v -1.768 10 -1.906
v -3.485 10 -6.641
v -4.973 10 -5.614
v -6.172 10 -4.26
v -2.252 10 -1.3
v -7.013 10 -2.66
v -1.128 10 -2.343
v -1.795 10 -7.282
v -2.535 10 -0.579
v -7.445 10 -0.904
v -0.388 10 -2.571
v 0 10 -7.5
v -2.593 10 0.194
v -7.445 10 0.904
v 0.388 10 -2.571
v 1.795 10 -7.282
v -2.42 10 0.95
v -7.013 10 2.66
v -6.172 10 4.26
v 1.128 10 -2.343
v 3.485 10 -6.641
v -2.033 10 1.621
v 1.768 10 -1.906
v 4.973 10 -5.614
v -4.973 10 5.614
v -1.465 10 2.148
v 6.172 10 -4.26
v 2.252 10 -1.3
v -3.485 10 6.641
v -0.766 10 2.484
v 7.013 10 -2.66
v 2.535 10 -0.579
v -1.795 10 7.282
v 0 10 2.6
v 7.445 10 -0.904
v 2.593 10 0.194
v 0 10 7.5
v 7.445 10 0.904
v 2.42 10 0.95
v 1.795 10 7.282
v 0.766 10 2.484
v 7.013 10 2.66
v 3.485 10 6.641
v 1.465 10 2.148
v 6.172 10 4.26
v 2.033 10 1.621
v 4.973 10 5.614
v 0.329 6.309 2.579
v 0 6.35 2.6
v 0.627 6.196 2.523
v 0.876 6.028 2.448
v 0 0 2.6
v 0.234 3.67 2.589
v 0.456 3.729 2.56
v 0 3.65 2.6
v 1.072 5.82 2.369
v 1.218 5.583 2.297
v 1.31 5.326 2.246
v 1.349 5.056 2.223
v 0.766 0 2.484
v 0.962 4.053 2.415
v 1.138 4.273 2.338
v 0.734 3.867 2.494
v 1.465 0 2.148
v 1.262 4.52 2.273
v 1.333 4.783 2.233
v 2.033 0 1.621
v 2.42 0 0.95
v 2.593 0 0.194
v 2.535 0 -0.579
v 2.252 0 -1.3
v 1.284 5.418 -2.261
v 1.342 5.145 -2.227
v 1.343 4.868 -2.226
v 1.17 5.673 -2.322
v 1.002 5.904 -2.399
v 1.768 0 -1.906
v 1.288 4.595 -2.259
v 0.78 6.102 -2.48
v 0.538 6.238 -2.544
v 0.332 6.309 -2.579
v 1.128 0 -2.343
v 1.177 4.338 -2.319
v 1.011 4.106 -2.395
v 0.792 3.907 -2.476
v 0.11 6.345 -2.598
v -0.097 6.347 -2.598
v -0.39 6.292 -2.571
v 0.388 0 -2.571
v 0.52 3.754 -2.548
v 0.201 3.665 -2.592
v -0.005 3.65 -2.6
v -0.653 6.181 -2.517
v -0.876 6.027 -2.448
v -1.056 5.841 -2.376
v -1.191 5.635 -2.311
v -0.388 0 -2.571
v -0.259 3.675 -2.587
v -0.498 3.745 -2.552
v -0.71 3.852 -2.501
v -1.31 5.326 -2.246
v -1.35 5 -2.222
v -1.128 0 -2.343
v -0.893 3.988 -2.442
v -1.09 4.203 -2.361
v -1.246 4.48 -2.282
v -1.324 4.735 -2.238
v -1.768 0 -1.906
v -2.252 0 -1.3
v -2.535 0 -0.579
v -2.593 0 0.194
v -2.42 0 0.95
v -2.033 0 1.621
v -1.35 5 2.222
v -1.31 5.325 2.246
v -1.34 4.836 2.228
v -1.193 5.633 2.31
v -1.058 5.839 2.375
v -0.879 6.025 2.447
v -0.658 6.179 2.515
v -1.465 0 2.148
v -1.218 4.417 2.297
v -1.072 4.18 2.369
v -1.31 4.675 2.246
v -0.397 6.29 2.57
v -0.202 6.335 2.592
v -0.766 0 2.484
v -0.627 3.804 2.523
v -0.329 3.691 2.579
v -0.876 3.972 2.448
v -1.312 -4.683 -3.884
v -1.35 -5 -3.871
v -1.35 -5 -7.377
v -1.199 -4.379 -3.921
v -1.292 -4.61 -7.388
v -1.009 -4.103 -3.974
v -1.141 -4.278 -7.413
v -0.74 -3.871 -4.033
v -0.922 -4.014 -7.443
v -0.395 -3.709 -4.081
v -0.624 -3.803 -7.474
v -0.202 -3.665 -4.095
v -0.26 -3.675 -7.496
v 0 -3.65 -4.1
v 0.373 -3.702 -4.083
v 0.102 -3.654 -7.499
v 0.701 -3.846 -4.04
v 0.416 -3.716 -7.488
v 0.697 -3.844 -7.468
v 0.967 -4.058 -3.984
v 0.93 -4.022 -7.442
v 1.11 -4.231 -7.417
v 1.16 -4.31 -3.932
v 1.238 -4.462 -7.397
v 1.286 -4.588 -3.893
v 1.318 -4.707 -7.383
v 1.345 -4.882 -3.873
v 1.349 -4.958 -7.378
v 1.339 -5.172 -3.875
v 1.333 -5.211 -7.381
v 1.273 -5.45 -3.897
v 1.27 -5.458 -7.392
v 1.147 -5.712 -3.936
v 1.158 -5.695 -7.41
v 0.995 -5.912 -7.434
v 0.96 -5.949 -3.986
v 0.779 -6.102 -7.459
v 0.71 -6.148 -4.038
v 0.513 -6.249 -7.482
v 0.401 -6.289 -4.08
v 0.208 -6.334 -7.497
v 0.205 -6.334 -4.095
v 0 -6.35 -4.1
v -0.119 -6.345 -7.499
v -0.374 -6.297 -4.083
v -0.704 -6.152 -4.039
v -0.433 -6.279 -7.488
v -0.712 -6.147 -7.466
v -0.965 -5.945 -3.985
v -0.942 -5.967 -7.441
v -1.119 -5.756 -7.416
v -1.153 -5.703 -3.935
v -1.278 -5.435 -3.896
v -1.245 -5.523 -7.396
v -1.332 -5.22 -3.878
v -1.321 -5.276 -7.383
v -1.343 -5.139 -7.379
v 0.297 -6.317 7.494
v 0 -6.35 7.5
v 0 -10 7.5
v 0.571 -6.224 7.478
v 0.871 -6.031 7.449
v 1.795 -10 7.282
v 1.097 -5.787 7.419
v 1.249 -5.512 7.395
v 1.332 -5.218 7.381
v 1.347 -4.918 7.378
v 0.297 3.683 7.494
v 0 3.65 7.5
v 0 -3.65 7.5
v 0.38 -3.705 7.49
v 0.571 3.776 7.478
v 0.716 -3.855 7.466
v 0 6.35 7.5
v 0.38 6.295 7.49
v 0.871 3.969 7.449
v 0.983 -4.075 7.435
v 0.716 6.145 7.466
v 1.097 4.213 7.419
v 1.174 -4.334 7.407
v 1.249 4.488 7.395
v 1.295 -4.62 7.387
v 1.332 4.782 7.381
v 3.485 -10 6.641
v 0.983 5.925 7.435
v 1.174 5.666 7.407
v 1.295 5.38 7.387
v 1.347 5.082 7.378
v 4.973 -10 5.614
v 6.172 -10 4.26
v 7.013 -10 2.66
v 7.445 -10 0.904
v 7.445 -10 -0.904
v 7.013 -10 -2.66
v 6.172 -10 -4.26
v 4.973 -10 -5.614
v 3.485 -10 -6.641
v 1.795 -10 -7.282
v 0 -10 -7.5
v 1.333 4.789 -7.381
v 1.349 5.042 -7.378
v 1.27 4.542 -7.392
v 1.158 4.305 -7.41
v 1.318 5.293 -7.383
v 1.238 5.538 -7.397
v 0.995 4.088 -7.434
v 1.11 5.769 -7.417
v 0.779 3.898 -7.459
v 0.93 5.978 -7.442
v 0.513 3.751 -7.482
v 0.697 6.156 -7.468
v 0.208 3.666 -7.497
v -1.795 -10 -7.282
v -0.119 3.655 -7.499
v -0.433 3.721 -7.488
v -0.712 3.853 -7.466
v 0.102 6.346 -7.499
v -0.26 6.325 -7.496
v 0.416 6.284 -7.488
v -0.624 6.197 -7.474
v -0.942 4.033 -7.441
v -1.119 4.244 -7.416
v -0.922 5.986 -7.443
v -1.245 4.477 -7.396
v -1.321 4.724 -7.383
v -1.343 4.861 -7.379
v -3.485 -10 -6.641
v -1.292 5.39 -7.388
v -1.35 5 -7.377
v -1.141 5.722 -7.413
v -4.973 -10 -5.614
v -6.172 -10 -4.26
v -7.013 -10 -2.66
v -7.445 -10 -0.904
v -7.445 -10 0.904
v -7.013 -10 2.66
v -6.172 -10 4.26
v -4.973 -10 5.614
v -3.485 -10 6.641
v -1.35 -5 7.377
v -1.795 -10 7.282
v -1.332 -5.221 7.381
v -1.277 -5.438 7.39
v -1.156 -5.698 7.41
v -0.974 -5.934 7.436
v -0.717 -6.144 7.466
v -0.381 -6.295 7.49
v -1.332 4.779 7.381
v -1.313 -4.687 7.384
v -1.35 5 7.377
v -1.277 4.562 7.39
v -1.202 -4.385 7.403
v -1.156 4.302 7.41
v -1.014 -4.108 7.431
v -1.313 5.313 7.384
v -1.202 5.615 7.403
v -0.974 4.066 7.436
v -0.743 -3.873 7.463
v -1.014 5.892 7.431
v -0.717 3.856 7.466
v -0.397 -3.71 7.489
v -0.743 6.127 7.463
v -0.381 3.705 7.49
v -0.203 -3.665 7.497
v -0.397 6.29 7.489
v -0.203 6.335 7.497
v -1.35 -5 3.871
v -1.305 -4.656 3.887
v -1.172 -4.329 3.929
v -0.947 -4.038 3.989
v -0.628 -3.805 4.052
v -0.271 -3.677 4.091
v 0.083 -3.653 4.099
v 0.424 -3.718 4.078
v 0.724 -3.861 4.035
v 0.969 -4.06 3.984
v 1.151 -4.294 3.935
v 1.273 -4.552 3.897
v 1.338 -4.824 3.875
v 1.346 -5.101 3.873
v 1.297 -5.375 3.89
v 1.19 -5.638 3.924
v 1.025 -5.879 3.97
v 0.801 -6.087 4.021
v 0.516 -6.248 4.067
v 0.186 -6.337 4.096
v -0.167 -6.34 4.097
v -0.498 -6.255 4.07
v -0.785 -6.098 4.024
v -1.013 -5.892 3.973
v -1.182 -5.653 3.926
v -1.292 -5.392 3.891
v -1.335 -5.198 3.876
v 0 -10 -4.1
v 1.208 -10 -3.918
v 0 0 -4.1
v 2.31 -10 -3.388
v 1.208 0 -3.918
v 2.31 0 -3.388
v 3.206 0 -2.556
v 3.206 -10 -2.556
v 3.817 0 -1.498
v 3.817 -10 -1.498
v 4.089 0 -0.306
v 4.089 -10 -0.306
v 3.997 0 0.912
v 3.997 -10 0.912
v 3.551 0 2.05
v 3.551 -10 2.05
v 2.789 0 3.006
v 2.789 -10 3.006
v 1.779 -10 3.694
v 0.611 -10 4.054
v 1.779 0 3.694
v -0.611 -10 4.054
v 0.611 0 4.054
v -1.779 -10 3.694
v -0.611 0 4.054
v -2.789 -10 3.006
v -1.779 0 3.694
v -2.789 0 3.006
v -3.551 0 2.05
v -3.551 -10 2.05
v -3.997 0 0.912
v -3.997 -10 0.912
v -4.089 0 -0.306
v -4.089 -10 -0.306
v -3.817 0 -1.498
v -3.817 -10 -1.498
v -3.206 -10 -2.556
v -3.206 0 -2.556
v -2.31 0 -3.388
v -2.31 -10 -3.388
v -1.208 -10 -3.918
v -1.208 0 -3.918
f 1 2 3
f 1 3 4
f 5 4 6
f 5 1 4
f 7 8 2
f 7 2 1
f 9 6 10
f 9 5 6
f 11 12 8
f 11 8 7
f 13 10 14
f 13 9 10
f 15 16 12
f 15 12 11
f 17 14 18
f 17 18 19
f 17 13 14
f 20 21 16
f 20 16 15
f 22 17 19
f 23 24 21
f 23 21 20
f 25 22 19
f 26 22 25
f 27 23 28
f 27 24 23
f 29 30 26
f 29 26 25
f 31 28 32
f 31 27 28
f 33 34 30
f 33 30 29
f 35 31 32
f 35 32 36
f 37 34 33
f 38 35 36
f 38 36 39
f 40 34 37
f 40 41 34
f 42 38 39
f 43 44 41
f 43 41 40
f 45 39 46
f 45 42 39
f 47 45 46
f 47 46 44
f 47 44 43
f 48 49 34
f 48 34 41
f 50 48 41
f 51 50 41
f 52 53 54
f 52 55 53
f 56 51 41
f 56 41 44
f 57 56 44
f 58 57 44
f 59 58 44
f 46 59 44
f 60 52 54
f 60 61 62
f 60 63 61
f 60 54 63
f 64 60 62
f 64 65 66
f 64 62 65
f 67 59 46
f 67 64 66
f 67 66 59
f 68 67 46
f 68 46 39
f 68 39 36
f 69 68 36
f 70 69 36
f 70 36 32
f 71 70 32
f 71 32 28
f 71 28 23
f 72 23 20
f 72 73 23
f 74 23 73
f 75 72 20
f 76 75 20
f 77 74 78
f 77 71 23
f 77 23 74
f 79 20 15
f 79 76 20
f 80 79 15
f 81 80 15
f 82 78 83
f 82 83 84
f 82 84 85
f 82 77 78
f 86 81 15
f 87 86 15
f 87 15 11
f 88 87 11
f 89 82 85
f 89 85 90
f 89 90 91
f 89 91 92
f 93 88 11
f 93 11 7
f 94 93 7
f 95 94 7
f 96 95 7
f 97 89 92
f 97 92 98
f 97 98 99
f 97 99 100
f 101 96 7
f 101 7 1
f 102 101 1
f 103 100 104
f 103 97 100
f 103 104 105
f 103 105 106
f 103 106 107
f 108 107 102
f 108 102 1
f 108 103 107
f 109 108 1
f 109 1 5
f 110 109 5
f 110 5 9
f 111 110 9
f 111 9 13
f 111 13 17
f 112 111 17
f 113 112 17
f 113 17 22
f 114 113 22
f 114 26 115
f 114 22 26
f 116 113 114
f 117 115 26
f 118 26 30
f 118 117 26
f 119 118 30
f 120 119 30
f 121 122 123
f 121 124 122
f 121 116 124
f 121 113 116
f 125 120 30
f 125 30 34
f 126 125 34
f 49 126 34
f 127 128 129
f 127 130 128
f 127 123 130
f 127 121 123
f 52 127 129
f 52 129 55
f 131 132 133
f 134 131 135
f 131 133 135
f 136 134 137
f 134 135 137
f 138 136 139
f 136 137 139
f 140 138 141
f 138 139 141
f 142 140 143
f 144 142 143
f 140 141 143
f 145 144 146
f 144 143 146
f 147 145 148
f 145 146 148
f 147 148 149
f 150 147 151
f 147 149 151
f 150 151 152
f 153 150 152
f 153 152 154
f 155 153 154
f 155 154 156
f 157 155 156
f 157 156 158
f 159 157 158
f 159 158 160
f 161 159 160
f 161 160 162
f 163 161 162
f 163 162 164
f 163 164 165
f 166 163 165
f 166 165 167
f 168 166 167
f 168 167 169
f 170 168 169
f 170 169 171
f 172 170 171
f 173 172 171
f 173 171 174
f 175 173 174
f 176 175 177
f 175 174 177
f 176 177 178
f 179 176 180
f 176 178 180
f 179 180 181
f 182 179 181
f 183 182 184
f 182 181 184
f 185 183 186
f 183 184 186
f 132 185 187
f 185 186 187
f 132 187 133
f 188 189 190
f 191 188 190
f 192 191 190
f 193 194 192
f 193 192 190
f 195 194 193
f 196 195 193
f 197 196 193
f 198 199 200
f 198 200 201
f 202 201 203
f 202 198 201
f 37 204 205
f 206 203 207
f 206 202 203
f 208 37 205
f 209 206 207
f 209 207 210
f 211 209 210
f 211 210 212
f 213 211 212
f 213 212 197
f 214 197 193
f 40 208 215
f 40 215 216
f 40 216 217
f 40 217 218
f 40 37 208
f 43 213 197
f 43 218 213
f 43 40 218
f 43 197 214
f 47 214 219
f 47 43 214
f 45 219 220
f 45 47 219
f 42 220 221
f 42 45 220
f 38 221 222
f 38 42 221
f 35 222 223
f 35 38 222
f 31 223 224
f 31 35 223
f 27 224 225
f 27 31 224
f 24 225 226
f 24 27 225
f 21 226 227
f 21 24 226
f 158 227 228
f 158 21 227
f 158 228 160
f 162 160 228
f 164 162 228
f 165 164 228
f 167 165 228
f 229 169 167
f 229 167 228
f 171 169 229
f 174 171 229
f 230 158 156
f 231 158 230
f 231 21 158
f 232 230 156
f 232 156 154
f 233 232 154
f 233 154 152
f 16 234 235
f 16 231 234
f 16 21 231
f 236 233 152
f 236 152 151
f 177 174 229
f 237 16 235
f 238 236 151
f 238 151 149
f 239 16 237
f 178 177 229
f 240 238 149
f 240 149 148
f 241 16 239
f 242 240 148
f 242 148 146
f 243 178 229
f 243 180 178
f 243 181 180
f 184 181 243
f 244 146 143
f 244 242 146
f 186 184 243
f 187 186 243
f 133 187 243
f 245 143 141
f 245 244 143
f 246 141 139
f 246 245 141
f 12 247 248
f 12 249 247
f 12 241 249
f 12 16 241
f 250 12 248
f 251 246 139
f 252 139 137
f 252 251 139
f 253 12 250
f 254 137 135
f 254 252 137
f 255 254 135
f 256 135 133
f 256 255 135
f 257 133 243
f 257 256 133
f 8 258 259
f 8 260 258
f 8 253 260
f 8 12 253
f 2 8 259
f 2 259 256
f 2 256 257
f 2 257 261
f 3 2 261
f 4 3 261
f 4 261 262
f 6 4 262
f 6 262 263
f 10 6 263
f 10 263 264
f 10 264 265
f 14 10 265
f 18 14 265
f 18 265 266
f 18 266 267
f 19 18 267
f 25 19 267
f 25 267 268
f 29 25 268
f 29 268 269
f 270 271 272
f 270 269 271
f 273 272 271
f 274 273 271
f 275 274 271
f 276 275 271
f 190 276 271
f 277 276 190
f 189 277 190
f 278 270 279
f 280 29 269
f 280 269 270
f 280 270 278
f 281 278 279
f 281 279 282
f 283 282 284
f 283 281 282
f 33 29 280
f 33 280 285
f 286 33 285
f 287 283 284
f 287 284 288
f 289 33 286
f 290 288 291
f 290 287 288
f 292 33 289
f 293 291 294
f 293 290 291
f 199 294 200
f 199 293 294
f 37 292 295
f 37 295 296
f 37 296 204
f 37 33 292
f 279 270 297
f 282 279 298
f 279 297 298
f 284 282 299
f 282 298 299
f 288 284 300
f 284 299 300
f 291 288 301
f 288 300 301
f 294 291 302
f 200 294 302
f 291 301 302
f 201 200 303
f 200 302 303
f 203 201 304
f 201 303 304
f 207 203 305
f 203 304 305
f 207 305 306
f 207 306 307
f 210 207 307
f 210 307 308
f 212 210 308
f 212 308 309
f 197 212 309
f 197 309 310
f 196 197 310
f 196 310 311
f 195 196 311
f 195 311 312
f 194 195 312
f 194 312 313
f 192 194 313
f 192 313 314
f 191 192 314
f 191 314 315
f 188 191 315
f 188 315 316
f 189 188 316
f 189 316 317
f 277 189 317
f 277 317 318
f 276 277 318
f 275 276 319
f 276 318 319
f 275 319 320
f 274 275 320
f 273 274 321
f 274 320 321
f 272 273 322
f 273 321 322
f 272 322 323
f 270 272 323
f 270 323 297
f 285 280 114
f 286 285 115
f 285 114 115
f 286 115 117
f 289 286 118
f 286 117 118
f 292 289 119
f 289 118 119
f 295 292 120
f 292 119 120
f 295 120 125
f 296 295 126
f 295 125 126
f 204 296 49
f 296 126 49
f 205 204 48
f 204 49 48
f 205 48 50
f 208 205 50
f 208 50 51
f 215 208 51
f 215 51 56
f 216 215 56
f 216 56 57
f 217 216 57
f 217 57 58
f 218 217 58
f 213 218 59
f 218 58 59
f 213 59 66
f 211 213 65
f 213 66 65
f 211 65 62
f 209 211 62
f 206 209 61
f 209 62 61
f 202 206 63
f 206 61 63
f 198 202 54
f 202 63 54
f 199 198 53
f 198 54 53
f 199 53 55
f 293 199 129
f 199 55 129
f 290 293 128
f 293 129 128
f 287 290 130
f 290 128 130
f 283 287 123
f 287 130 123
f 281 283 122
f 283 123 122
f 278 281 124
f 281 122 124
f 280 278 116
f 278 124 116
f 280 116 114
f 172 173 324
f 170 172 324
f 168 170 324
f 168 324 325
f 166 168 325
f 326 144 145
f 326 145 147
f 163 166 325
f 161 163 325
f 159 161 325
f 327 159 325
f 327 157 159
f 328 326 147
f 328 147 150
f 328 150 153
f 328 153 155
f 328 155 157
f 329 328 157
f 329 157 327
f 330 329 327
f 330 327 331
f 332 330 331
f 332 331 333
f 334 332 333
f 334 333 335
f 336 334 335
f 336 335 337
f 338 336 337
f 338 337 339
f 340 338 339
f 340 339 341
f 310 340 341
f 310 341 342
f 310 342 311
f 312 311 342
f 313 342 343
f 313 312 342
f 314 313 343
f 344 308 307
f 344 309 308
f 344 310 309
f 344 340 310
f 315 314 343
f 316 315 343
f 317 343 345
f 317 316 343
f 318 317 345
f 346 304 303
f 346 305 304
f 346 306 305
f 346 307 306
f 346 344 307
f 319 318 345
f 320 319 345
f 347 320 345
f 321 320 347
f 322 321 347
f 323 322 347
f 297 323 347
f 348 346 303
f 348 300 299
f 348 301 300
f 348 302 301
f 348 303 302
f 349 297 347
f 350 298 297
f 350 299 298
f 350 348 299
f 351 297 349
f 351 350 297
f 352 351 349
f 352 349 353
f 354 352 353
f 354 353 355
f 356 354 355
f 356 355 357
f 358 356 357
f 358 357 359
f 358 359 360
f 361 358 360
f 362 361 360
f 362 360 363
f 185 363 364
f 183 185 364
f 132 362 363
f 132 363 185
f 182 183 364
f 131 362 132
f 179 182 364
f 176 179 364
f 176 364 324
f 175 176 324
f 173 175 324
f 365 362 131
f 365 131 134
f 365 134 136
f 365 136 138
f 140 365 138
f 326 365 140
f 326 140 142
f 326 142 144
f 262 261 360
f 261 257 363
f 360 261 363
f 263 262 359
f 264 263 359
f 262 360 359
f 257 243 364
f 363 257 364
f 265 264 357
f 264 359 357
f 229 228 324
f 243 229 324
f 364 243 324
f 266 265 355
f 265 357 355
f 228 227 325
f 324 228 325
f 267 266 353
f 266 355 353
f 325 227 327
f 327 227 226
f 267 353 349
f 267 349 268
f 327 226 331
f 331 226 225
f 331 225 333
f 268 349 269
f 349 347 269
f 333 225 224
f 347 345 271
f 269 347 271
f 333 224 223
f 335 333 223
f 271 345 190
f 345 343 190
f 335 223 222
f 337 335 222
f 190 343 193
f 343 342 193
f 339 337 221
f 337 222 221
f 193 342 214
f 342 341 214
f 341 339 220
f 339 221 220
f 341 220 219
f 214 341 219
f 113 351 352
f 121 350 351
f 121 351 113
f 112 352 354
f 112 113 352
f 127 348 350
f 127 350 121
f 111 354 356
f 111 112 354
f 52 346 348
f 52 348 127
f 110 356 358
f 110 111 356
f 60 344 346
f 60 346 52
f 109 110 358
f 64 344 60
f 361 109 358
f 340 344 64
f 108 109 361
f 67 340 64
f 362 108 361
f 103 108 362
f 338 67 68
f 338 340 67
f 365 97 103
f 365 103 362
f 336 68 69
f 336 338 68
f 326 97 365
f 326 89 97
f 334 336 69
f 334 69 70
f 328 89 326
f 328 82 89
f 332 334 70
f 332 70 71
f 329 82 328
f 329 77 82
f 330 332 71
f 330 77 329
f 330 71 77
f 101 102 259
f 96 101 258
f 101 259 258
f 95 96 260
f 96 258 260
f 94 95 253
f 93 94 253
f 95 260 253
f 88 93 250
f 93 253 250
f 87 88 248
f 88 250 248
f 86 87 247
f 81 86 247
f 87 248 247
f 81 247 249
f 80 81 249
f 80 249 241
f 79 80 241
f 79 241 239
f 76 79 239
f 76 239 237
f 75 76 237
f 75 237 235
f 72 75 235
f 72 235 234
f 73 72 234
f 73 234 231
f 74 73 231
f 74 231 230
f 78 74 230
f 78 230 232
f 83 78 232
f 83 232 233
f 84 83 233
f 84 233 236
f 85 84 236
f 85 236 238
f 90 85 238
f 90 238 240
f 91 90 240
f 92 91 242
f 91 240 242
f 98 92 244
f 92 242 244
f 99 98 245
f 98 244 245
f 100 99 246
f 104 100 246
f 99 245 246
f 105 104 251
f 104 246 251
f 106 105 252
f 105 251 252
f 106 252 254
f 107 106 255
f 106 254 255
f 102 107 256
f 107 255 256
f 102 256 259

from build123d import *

# Parameters (mm, degrees)
SKETCH1_R                  = 7.5
BOSS_EXTRUDE1_DEPTH        = 10
CUT_EXTRUDE1_START         = -10
SKETCH2_R                  = 2.6
CUT_EXTRUDE1_DEPTH         = 10
CUT_EXTRUDE2_START         = -10
SKETCH3_R                  = 4.1
CUT_EXTRUDE2_DEPTH         = 10
F_2_7_2_7_DIAMETER_HOLE1_D = 2.7


with BuildPart() as part:
    # Sketch1 → Boss-Extrude1 (new, symmetric)
    with BuildSketch(Plane(origin=(0, 0, 0), x_dir=(1, 0, 0), z_dir=(0, 1, 0))):
        with Locations(Location((0, 0, 0), (0, 0, 270))):
            Circle(SKETCH1_R)
    extrude(amount=BOSS_EXTRUDE1_DEPTH, both=True)

    # Sketch2 → Cut-Extrude1 (cut)
    with BuildSketch(Plane(origin=(0, 10, 0), x_dir=(1, 0, 0), z_dir=(0, 1, 0)).offset(CUT_EXTRUDE1_START)):
        with Locations(Location((0, 0, 0), (0, 0, 270))):
            Circle(SKETCH2_R)
    extrude(amount=CUT_EXTRUDE1_DEPTH, mode=Mode.SUBTRACT)

    # Sketch3 → Cut-Extrude2 (cut)
    with BuildSketch(Plane.XZ.offset(10).offset(CUT_EXTRUDE2_START)):
        with Locations(Location((0, 0, 0), (0, 0, 270))):
            Circle(SKETCH3_R)
    extrude(amount=CUT_EXTRUDE2_DEPTH, mode=Mode.SUBTRACT)

    # Ø2.7 (2.7) Diameter Hole1 (through all)
    with Locations(Plane.XY.offset(10)):
        with Locations((0, 5), (0, -5)):
            Hole(F_2_7_2_7_DIAMETER_HOLE1_D / 2)


solid = part.part
